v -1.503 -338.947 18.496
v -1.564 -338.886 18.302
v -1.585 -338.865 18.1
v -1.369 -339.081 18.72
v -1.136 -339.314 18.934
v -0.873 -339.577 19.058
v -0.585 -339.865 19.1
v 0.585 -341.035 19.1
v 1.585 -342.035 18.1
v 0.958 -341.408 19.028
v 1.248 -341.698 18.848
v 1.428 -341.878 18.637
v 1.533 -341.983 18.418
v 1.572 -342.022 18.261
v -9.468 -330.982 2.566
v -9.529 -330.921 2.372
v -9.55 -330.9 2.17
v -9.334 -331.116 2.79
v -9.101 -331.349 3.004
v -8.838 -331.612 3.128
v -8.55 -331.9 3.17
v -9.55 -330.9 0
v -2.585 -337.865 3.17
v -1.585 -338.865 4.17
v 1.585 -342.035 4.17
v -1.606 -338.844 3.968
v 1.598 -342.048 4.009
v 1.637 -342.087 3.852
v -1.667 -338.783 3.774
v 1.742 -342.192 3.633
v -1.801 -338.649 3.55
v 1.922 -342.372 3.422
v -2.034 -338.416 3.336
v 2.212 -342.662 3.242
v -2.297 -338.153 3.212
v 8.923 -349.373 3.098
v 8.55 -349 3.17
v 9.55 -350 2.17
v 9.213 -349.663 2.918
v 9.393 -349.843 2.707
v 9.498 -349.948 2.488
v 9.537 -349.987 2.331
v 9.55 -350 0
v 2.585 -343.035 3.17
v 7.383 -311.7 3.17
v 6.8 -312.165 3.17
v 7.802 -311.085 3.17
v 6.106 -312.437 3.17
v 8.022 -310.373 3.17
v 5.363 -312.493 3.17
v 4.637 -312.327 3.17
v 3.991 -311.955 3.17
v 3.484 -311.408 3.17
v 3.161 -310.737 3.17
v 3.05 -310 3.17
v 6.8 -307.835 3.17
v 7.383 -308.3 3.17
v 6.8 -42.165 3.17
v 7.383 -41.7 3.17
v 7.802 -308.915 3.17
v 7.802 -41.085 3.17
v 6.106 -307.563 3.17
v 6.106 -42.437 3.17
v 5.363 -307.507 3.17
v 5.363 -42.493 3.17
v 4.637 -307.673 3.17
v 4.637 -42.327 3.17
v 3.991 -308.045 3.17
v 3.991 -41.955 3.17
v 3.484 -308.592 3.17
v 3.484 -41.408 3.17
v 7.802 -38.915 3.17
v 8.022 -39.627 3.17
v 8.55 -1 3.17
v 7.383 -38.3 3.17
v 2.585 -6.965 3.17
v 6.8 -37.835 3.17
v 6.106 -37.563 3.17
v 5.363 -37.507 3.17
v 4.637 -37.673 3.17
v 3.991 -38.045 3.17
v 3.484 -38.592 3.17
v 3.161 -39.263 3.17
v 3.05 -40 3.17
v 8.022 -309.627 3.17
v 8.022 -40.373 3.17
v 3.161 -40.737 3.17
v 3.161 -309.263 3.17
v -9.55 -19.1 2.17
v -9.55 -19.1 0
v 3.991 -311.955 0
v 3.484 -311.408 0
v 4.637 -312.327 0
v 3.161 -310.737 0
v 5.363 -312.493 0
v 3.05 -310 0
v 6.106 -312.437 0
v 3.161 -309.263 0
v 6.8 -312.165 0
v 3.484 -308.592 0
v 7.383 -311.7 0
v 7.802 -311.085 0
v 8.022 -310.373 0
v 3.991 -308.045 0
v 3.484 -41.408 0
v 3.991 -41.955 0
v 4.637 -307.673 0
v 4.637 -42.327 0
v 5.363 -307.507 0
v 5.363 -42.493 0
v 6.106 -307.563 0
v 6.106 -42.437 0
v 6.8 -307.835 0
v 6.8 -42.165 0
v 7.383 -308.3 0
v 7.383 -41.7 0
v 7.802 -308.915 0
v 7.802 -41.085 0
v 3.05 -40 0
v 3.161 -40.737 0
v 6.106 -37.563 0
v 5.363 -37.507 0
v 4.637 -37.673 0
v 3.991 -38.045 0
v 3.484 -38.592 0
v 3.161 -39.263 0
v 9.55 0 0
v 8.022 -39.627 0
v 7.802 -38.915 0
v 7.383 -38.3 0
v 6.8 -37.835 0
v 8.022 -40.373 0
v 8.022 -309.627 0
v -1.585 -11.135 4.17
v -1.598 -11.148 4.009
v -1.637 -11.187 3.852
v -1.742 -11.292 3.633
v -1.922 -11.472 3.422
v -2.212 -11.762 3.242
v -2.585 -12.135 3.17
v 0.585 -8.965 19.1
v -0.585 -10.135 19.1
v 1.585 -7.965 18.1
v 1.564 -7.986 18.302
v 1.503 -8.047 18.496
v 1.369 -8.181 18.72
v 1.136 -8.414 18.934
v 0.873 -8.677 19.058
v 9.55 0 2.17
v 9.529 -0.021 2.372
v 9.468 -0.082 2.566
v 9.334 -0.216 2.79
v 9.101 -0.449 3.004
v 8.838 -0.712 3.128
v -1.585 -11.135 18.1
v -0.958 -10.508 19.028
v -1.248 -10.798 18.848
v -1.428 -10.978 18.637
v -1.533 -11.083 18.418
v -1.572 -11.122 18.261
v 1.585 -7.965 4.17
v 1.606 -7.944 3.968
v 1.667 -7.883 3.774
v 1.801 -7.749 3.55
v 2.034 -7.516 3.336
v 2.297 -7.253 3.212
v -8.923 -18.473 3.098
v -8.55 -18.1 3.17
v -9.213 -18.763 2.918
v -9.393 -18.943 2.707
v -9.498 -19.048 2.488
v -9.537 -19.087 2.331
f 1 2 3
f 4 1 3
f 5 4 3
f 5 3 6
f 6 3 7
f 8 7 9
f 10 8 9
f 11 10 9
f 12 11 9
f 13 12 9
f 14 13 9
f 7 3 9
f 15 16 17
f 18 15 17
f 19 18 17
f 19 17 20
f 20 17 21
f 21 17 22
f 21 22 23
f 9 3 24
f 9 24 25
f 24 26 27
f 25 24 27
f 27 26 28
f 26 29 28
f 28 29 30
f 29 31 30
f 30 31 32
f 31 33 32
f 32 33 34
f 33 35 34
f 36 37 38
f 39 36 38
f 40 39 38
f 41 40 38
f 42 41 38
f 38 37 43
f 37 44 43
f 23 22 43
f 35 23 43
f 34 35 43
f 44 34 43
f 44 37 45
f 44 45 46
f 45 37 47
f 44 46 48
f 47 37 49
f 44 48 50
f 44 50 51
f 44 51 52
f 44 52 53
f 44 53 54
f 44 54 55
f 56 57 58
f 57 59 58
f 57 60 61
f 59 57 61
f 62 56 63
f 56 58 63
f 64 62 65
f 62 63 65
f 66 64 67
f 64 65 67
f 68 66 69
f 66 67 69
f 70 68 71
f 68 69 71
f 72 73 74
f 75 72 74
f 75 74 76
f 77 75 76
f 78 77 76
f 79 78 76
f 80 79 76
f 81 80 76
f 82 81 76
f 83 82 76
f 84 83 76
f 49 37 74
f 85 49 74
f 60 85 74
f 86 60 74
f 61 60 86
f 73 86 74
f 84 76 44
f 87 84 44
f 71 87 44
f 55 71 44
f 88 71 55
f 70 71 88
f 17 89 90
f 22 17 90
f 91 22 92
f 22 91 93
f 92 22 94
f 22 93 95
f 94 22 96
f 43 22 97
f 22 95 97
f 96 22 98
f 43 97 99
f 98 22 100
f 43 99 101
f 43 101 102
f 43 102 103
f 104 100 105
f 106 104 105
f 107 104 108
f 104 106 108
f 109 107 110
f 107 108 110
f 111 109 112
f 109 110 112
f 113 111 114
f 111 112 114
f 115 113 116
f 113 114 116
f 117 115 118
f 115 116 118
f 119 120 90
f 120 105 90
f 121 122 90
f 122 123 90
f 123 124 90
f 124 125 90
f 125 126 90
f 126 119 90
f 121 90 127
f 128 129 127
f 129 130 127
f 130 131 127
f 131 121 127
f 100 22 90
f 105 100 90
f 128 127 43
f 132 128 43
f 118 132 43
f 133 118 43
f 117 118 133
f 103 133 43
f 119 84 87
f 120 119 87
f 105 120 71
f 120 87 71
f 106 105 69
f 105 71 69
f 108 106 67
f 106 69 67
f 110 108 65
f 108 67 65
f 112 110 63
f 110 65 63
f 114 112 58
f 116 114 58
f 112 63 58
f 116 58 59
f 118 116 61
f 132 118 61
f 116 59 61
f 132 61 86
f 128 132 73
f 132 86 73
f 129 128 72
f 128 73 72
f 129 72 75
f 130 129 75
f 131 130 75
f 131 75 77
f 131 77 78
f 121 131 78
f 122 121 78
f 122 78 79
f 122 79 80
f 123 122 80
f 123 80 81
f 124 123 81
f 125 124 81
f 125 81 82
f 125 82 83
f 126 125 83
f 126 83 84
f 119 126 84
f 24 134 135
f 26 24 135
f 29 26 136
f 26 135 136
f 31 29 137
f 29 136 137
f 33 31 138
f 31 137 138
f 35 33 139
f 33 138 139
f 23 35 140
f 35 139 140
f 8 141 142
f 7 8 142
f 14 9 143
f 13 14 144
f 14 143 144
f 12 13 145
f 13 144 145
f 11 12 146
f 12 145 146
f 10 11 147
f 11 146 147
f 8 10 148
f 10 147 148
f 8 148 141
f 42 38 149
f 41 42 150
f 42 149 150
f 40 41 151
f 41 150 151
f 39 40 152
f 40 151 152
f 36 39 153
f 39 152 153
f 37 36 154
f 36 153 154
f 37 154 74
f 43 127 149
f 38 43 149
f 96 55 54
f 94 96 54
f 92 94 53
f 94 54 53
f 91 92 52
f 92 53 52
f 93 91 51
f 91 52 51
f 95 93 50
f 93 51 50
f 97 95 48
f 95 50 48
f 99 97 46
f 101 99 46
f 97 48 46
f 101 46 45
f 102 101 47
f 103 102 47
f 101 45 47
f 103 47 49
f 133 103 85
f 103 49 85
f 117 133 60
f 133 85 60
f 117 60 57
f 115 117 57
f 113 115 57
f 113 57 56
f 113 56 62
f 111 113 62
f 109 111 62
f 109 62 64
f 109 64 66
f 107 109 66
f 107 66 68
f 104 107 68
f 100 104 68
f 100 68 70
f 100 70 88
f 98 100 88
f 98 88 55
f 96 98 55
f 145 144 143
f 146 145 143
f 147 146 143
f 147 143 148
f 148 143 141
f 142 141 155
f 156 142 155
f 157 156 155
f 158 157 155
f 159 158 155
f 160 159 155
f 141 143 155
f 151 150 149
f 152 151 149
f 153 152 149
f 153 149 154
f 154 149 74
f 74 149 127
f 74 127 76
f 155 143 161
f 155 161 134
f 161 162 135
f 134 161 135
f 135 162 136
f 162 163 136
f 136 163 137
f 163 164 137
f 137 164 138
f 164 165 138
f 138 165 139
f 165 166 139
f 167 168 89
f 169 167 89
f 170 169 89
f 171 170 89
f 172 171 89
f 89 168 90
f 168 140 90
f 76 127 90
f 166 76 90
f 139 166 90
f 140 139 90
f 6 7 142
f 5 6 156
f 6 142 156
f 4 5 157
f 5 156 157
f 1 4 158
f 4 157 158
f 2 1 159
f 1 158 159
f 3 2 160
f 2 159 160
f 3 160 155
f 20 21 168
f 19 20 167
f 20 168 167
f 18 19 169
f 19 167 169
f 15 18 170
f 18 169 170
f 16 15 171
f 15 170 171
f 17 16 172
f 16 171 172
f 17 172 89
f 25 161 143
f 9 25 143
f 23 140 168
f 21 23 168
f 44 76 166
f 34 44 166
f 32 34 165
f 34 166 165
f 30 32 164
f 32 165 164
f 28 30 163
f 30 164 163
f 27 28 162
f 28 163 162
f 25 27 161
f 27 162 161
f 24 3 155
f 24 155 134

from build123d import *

# Parameters (mm, degrees)
F1_DEPTH = 350
F3_DEPTH = 20
F5_D     = 5


with BuildPart() as f1:
    # F0 (on Front) → F1 (new body)
    with BuildSketch(Plane.XZ):
        with BuildLine():
            Line((-9.55, 2.17), (-9.55, 0))
            Line((-9.55, 0), (9.55, 0))
            Line((9.55, 0), (9.55, 2.17))
            ThreePointArc((9.55, 2.17), (9.257107, 2.877107), (8.55, 3.17))
            Line((8.55, 3.17), (2.585, 3.17))
            ThreePointArc((2.585, 3.17), (1.877893, 3.462893), (1.585, 4.17))
            Line((1.585, 4.17), (1.585, 18.1))
            ThreePointArc((1.585, 18.1), (1.292107, 18.807107), (0.585, 19.1))
            Line((0.585, 19.1), (-0.585, 19.1))
            ThreePointArc((-0.585, 19.1), (-1.292107, 18.807107), (-1.585, 18.1))
            Line((-1.585, 18.1), (-1.585, 4.17))
            ThreePointArc((-1.585, 4.17), (-1.877893, 3.462893), (-2.585, 3.17))
            Line((-2.585, 3.17), (-8.55, 3.17))
            ThreePointArc((-8.55, 3.17), (-9.257107, 2.877107), (-9.55, 2.17))
        make_face()
    extrude(amount=F1_DEPTH)

    # F2 (on face) → F3 (cut)
    with BuildSketch(Plane(origin=(0, 0, 0), x_dir=(1, 0, 0), z_dir=(0, 0, -1))):
        Polygon((-9.55, 330.9), (9.55, 350), (-9.55, 350), align=None)
        Polygon((-9.55, 0), (9.55, 0), (-9.55, 19.1), align=None)
    extrude(amount=-F3_DEPTH, mode=Mode.SUBTRACT)

    # F5 (through all)
    with Locations(Plane(origin=(0, 0, 0), x_dir=(1, 0, 0), z_dir=(0, 0, -1))):
        with Locations((5.55, 310), (5.55, 40)):
            Hole(F5_D / 2)


solid = f1.part
